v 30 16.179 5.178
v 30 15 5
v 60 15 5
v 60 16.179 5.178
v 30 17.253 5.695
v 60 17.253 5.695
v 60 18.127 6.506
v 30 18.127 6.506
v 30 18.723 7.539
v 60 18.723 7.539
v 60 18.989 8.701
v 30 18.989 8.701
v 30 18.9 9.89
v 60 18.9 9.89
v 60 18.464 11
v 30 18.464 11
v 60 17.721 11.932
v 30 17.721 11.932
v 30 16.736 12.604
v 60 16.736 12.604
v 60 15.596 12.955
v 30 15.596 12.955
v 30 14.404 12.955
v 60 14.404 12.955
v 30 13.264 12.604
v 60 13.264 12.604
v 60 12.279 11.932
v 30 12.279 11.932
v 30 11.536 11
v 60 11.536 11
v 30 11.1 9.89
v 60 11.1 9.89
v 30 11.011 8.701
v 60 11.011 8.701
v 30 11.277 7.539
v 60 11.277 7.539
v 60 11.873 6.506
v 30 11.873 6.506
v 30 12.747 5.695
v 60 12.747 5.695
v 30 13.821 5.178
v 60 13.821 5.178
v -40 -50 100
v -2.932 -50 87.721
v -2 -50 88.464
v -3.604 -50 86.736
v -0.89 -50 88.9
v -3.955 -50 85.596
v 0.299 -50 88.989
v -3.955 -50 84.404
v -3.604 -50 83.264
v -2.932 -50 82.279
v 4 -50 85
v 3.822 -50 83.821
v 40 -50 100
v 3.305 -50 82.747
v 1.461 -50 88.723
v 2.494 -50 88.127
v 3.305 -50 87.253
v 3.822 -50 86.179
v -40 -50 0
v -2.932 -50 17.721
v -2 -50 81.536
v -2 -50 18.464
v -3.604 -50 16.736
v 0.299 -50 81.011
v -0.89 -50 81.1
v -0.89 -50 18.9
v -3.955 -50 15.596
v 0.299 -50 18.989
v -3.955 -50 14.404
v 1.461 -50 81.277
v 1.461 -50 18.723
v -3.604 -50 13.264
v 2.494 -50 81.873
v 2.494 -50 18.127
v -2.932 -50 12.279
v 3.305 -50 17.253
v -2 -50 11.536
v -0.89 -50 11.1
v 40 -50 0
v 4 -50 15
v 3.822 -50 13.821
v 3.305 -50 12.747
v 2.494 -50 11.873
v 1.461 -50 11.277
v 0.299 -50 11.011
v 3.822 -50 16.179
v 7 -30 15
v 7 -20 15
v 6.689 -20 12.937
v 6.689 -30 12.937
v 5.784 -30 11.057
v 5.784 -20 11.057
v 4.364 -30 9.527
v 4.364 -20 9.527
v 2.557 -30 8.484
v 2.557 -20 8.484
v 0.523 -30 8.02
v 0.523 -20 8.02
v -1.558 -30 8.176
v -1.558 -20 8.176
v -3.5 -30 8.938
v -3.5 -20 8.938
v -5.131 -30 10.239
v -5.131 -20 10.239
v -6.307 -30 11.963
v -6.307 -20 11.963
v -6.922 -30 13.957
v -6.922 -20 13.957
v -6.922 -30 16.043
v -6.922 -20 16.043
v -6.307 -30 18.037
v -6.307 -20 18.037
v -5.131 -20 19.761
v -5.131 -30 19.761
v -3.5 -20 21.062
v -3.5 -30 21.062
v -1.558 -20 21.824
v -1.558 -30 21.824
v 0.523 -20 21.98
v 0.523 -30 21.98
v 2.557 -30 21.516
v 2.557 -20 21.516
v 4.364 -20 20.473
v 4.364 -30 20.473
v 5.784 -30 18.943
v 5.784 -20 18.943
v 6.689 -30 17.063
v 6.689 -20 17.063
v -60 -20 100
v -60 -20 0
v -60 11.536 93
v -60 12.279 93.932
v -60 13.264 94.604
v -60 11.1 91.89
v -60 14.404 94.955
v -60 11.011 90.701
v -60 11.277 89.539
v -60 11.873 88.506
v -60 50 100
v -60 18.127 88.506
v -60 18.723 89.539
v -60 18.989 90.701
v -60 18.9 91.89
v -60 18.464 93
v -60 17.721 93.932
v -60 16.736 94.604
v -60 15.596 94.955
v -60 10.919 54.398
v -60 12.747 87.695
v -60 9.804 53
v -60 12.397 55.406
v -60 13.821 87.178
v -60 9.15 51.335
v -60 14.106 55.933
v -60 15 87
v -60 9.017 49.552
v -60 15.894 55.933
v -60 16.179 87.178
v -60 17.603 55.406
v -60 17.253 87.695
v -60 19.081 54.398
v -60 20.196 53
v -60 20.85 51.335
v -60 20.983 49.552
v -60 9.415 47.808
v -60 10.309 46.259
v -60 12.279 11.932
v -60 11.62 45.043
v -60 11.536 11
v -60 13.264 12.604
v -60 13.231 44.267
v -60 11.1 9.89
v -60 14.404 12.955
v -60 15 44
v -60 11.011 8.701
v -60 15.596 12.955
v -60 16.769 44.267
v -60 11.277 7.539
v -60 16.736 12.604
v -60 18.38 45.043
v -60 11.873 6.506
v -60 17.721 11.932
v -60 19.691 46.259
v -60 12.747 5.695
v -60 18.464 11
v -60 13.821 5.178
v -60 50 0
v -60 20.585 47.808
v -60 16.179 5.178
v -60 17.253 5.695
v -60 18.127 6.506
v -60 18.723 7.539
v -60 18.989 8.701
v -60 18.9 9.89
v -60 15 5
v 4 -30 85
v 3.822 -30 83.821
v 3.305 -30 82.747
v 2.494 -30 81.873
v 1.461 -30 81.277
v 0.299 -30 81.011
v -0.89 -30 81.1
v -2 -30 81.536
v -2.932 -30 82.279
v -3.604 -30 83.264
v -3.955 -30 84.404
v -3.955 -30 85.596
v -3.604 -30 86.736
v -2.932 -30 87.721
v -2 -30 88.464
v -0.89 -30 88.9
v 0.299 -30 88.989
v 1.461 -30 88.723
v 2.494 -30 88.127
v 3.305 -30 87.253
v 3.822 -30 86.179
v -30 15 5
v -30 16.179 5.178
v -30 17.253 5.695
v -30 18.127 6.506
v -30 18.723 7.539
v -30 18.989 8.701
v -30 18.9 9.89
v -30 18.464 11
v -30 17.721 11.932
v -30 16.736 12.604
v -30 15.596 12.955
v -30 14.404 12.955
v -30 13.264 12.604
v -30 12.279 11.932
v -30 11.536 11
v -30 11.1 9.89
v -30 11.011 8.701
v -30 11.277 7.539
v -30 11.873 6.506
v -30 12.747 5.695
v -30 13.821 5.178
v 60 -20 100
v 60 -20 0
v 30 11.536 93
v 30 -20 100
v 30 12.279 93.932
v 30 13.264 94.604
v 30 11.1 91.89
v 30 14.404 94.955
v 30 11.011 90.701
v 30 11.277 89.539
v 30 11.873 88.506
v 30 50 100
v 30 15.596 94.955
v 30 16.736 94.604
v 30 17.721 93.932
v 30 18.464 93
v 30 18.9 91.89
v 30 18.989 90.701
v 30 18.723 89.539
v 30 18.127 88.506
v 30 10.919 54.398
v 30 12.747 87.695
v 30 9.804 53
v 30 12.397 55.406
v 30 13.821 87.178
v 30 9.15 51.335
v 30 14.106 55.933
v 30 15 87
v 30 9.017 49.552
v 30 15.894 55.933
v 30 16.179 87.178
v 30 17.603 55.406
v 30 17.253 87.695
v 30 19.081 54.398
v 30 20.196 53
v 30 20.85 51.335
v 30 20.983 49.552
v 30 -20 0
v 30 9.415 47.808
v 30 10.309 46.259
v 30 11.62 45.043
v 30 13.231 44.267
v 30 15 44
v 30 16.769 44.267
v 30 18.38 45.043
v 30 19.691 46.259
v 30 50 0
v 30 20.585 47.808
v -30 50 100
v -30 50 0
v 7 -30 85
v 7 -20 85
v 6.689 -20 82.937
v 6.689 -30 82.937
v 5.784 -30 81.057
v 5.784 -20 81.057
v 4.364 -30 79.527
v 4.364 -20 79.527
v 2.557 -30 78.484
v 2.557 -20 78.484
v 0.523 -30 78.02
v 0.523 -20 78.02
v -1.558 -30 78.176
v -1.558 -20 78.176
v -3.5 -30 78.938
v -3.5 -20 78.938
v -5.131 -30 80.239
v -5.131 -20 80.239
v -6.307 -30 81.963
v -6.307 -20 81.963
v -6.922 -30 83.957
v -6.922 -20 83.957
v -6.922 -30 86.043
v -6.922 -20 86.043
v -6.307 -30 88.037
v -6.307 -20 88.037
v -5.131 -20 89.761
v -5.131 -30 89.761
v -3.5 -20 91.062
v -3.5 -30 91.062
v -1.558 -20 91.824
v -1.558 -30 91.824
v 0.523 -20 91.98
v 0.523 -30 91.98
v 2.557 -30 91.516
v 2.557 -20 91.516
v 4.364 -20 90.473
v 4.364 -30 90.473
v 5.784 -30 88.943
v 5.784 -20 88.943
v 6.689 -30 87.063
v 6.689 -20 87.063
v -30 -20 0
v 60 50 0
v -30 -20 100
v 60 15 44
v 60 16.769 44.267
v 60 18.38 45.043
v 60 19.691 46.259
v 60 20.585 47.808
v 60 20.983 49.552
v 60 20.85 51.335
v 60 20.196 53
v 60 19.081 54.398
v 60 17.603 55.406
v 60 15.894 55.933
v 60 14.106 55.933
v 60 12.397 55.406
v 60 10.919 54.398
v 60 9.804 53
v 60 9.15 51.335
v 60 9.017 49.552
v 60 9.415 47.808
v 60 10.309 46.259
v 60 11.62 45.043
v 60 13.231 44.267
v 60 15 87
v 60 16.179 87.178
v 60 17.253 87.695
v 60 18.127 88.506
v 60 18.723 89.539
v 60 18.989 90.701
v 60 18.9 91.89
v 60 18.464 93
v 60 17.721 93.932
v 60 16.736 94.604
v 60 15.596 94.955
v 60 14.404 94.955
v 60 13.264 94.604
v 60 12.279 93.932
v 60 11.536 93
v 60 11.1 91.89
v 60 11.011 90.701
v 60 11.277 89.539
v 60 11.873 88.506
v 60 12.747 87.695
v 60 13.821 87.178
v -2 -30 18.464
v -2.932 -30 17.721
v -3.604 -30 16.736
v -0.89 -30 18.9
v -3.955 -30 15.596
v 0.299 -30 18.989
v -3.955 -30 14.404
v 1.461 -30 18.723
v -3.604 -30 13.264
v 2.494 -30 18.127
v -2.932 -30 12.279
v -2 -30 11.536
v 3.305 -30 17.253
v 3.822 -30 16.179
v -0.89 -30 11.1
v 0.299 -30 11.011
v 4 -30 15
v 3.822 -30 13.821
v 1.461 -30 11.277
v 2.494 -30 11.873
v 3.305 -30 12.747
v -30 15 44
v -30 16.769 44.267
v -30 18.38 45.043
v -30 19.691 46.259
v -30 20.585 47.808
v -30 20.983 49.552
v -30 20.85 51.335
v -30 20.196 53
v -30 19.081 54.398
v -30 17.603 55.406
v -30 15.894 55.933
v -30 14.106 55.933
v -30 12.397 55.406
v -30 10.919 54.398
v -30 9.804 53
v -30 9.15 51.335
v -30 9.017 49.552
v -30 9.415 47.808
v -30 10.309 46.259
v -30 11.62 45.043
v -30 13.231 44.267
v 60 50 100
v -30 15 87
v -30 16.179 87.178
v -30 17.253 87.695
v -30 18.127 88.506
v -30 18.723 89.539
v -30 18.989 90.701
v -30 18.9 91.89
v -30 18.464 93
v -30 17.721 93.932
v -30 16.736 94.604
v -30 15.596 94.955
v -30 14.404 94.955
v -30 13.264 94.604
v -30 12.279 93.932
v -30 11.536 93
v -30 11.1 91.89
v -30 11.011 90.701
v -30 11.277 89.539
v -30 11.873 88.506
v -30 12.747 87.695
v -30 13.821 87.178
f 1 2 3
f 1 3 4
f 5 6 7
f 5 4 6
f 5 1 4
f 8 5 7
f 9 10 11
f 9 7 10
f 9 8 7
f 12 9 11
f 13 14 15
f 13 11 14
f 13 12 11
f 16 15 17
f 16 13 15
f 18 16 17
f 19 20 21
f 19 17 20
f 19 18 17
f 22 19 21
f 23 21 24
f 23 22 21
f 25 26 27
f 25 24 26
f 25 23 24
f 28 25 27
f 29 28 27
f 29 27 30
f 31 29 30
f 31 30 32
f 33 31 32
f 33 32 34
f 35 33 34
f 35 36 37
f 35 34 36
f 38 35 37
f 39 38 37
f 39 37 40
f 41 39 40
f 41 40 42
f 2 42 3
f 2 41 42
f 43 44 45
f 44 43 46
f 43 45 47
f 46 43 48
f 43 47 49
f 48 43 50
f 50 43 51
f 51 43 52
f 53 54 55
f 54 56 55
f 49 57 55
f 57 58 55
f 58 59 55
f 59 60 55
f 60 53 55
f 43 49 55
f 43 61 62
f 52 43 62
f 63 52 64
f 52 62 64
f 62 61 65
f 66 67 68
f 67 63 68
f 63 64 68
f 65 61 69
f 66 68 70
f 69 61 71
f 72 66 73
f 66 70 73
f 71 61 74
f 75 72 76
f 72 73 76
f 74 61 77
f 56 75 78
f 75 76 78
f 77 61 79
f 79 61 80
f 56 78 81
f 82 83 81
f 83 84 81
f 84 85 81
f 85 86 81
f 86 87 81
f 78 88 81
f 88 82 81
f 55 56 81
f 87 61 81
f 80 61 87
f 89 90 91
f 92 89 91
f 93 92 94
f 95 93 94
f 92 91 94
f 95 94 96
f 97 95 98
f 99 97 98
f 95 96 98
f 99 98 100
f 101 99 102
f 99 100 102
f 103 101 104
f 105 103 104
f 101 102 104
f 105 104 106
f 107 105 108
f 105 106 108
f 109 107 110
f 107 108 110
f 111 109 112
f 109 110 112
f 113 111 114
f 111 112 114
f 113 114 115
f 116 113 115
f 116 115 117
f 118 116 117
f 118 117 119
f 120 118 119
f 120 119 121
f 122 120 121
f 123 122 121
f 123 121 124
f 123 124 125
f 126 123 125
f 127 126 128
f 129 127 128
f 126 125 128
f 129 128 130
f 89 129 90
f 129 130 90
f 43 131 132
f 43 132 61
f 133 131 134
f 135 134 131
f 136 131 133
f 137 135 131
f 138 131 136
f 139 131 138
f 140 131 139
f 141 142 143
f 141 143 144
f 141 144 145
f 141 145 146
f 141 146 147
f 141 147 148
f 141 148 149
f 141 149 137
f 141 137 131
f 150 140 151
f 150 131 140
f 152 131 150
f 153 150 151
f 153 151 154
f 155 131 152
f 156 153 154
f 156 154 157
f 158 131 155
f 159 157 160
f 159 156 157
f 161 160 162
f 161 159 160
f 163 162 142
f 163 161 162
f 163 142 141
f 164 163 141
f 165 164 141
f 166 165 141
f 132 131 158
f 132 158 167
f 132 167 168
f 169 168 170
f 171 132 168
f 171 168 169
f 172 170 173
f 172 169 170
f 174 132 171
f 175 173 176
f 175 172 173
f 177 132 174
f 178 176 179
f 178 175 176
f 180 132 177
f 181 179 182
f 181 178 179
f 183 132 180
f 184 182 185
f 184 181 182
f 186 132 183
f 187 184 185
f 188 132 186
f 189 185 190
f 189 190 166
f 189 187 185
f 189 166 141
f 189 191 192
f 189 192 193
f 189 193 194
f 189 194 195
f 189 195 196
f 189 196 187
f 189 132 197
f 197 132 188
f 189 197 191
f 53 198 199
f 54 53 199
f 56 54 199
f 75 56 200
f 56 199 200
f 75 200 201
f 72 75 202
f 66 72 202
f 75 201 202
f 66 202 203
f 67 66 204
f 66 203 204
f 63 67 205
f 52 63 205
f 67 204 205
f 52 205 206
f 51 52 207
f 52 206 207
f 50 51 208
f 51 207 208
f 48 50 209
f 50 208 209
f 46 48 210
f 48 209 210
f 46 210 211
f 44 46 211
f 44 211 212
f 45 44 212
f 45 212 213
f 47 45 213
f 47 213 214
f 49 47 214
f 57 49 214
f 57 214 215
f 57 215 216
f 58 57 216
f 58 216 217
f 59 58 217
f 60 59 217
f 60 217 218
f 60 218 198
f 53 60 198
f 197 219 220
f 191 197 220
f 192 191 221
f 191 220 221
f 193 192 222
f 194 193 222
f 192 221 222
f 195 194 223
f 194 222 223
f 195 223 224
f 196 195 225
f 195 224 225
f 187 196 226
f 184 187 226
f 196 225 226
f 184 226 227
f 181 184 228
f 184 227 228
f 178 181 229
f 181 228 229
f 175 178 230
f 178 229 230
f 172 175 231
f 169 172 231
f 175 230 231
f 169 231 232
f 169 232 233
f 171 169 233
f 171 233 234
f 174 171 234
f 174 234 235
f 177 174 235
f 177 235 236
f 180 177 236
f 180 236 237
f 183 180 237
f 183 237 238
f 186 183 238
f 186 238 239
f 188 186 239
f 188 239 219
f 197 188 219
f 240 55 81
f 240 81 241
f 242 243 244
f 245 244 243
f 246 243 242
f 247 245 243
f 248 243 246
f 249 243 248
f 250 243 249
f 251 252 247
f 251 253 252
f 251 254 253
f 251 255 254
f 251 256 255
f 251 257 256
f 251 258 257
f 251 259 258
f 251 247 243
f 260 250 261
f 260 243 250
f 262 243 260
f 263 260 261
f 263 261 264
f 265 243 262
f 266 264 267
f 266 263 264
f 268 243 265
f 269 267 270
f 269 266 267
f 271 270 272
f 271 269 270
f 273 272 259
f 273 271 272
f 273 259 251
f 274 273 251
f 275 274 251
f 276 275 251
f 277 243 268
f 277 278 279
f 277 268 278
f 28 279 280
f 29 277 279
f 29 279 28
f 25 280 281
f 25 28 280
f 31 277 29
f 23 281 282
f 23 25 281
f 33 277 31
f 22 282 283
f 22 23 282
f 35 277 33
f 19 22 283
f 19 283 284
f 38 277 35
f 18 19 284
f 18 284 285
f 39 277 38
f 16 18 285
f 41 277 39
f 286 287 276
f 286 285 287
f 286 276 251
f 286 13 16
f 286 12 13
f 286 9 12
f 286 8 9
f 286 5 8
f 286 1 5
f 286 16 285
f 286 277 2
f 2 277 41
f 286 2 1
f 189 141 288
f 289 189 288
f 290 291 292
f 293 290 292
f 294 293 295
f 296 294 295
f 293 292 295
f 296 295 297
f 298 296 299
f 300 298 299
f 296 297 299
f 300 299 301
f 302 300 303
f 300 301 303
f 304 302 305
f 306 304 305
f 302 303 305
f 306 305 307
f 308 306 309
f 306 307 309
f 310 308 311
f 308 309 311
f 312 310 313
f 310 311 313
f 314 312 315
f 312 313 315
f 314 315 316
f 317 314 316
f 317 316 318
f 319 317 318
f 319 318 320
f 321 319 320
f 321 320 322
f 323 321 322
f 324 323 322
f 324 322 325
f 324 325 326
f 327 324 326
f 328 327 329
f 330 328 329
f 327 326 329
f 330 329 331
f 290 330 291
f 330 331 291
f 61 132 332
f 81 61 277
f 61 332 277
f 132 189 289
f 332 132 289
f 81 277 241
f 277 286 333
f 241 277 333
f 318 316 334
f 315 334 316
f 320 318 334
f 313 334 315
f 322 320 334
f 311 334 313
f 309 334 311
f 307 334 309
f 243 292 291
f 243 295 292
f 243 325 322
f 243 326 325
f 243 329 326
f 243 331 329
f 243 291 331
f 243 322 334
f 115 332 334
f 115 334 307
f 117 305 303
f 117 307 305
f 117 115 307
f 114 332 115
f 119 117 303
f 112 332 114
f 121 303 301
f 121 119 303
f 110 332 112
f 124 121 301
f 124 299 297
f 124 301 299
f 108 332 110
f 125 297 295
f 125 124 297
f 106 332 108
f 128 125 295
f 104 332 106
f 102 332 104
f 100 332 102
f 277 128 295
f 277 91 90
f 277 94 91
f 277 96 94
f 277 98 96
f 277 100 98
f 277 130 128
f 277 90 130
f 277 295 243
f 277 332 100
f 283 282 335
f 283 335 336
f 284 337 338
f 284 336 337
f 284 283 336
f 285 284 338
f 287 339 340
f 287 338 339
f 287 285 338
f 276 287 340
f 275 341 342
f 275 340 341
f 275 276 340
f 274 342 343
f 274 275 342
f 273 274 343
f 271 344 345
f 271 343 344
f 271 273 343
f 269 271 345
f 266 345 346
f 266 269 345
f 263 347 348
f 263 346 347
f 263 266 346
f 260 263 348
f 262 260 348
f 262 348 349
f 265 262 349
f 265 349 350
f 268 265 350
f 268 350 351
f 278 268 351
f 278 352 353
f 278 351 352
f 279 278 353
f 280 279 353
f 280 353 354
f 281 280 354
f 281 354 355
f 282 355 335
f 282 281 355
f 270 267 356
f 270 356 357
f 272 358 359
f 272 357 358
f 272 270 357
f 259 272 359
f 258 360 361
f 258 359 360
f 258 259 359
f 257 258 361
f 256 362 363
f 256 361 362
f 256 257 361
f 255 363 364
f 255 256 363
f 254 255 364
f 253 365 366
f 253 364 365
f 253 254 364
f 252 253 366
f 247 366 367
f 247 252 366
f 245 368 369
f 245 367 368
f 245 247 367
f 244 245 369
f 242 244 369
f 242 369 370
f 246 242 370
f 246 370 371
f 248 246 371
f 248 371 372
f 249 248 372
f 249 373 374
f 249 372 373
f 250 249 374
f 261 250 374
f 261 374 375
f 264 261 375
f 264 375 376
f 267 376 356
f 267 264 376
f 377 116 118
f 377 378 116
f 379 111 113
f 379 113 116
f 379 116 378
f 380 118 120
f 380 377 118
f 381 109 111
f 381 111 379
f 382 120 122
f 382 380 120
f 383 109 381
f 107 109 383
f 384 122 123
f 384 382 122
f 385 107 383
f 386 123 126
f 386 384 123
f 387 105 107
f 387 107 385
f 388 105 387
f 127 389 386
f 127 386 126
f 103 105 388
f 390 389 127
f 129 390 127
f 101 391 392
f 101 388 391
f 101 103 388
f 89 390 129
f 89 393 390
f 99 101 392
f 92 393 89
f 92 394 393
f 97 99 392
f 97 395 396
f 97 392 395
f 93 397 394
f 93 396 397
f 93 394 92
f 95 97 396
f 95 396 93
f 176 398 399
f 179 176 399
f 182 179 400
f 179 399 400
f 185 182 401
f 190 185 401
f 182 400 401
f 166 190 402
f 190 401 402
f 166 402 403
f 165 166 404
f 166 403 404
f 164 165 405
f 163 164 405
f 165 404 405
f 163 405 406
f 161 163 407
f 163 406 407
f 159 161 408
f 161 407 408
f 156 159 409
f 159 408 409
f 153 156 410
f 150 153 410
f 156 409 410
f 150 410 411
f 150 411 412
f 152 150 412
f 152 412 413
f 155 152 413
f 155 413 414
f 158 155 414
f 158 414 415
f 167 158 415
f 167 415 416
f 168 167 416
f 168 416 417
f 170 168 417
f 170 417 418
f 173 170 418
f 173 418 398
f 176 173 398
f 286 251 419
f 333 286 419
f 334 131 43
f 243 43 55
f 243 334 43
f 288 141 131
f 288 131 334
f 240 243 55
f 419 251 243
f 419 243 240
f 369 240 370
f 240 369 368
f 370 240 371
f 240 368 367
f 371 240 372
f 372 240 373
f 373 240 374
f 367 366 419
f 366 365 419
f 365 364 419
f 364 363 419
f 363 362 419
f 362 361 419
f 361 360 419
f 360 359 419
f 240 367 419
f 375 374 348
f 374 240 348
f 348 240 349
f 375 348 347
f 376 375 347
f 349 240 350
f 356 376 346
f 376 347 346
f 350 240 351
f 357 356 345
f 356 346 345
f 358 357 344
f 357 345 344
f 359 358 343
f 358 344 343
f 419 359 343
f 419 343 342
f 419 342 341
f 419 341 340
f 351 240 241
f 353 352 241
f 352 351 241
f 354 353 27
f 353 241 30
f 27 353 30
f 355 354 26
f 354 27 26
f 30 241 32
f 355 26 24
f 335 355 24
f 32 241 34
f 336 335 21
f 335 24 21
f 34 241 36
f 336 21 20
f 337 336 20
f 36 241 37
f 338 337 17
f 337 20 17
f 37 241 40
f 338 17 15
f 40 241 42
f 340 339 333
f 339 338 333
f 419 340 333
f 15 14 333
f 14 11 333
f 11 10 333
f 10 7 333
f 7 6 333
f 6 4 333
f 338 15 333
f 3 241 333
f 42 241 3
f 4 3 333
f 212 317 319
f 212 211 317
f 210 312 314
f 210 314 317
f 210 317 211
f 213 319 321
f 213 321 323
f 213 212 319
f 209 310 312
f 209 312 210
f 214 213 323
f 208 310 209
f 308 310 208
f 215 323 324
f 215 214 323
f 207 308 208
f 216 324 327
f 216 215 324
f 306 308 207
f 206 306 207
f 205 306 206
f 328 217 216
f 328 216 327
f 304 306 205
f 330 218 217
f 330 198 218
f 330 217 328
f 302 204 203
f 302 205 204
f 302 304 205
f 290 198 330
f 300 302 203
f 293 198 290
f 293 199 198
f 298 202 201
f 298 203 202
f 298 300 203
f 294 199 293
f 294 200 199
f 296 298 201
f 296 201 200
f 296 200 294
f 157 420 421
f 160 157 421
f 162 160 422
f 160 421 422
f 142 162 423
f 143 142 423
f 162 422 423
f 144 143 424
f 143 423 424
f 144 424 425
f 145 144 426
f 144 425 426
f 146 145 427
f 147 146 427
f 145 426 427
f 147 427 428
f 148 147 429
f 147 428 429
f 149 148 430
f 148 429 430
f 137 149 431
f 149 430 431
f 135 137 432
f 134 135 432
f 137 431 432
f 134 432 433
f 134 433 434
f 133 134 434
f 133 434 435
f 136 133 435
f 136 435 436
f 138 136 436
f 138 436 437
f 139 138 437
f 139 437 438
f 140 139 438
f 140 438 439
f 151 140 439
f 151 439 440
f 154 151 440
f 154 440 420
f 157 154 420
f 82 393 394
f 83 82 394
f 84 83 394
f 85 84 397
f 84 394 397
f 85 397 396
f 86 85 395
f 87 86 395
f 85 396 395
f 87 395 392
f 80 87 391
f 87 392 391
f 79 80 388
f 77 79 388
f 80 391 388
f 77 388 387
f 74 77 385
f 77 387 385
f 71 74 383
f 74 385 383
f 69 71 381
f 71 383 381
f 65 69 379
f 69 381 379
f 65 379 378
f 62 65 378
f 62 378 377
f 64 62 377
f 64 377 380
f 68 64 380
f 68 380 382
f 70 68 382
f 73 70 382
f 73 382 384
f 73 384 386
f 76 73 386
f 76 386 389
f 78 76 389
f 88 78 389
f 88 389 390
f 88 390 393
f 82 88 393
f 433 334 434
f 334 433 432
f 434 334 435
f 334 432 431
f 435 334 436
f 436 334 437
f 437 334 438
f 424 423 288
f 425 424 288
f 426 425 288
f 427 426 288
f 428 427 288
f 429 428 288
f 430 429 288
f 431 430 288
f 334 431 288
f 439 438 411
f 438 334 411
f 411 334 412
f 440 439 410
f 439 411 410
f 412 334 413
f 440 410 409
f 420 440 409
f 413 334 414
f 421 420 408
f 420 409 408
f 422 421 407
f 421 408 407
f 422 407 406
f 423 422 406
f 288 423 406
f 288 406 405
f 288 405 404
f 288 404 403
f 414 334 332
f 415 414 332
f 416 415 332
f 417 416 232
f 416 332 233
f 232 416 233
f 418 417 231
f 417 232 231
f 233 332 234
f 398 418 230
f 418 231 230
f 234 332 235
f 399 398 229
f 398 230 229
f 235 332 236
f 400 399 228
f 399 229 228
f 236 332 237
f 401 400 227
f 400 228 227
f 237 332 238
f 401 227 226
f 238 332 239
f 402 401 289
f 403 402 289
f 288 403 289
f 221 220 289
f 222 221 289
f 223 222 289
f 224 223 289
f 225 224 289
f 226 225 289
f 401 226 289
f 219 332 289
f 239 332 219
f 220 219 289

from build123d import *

# Parameters (mm, degrees)
SKETCH1_W               = 120
SKETCH1_H               = 100
BOSS_EXTRUDE1_DEPTH     = 100
SKETCH2_W               = 60
SKETCH2_H               = 70
CUT_EXTRUDE2_DEPTH      = 101
CUT_EXTRUDE2_DEPTH_BACK = 1
SKETCH3_R               = 4
CUT_EXTRUDE3_DEPTH      = 51
CUT_EXTRUDE3_DEPTH_BACK = 51
SKETCH5_R               = 4
CUT_EXTRUDE4_DEPTH      = 61
CUT_EXTRUDE4_DEPTH_BACK = 61
SKETCH6_R               = 6
CUT_EXTRUDE5_DEPTH      = 61
CUT_EXTRUDE5_DEPTH_BACK = 61
CUT_EXTRUDE7_START      = -20
SKETCH7_R               = 7
CUT_EXTRUDE7_DEPTH      = 10


with BuildPart() as part:
    # Sketch1 → Boss-Extrude1 (new body)
    with BuildSketch(Plane.XY):
        Rectangle(SKETCH1_W, SKETCH1_H)
    extrude(amount=BOSS_EXTRUDE1_DEPTH)

    # Sketch2 → Cut-Extrude2 (cut, two sides)
    with BuildSketch(Plane.XY) as cut_extrude2_sk:
        Polygon((-60, -20), (-40, -50), (-60, -50), align=None)
        with Locations((0, 15)):
            Rectangle(SKETCH2_W, SKETCH2_H)
        Polygon((60, -50), (40, -50), (60, -20), align=None)
    extrude(amount=CUT_EXTRUDE2_DEPTH, mode=Mode.SUBTRACT)
    extrude(cut_extrude2_sk.sketch, amount=-CUT_EXTRUDE2_DEPTH_BACK, mode=Mode.SUBTRACT)

    # Sketch3 → Cut-Extrude3 (cut, two sides)
    with BuildSketch(Plane(origin=(0, 0, 0), x_dir=(1, 0, 0), z_dir=(0, 1, 0))) as cut_extrude3_sk:
        with Locations((0, -85)):
            Circle(SKETCH3_R)
        with Locations((0, -15)):
            Circle(SKETCH3_R)
    extrude(amount=CUT_EXTRUDE3_DEPTH, mode=Mode.SUBTRACT)
    extrude(cut_extrude3_sk.sketch, amount=-CUT_EXTRUDE3_DEPTH_BACK, mode=Mode.SUBTRACT)

    # Sketch5 → Cut-Extrude4 (cut, two sides)
    with BuildSketch(Plane(origin=(0, 0, 0), x_dir=(0, 0, -1), z_dir=(1, 0, 0))) as cut_extrude4_sk:
        with Locations((-91, 15)):
            Circle(SKETCH5_R)
        with Locations((-9, 15)):
            Circle(SKETCH5_R)
    extrude(amount=CUT_EXTRUDE4_DEPTH, mode=Mode.SUBTRACT)
    extrude(cut_extrude4_sk.sketch, amount=-CUT_EXTRUDE4_DEPTH_BACK, mode=Mode.SUBTRACT)

    # Sketch6 → Cut-Extrude5 (cut, two sides)
    with BuildSketch(Plane(origin=(0, 0, 0), x_dir=(0, 0, -1), z_dir=(1, 0, 0))) as cut_extrude5_sk:
        with Locations((-50, 15)):
            Circle(SKETCH6_R)
    extrude(amount=CUT_EXTRUDE5_DEPTH, mode=Mode.SUBTRACT)
    extrude(cut_extrude5_sk.sketch, amount=-CUT_EXTRUDE5_DEPTH_BACK, mode=Mode.SUBTRACT)

    # Sketch7 → Cut-Extrude7 (cut)
    with BuildSketch(Plane(origin=(0, 0, 0), x_dir=(1, 0, 0), z_dir=(0, 1, 0)).offset(CUT_EXTRUDE7_START)):
        with Locations((0, -85)):
            Circle(SKETCH7_R)
        with Locations((0, -15)):
            Circle(SKETCH7_R)
    extrude(amount=-CUT_EXTRUDE7_DEPTH, mode=Mode.SUBTRACT)


solid = part.part
